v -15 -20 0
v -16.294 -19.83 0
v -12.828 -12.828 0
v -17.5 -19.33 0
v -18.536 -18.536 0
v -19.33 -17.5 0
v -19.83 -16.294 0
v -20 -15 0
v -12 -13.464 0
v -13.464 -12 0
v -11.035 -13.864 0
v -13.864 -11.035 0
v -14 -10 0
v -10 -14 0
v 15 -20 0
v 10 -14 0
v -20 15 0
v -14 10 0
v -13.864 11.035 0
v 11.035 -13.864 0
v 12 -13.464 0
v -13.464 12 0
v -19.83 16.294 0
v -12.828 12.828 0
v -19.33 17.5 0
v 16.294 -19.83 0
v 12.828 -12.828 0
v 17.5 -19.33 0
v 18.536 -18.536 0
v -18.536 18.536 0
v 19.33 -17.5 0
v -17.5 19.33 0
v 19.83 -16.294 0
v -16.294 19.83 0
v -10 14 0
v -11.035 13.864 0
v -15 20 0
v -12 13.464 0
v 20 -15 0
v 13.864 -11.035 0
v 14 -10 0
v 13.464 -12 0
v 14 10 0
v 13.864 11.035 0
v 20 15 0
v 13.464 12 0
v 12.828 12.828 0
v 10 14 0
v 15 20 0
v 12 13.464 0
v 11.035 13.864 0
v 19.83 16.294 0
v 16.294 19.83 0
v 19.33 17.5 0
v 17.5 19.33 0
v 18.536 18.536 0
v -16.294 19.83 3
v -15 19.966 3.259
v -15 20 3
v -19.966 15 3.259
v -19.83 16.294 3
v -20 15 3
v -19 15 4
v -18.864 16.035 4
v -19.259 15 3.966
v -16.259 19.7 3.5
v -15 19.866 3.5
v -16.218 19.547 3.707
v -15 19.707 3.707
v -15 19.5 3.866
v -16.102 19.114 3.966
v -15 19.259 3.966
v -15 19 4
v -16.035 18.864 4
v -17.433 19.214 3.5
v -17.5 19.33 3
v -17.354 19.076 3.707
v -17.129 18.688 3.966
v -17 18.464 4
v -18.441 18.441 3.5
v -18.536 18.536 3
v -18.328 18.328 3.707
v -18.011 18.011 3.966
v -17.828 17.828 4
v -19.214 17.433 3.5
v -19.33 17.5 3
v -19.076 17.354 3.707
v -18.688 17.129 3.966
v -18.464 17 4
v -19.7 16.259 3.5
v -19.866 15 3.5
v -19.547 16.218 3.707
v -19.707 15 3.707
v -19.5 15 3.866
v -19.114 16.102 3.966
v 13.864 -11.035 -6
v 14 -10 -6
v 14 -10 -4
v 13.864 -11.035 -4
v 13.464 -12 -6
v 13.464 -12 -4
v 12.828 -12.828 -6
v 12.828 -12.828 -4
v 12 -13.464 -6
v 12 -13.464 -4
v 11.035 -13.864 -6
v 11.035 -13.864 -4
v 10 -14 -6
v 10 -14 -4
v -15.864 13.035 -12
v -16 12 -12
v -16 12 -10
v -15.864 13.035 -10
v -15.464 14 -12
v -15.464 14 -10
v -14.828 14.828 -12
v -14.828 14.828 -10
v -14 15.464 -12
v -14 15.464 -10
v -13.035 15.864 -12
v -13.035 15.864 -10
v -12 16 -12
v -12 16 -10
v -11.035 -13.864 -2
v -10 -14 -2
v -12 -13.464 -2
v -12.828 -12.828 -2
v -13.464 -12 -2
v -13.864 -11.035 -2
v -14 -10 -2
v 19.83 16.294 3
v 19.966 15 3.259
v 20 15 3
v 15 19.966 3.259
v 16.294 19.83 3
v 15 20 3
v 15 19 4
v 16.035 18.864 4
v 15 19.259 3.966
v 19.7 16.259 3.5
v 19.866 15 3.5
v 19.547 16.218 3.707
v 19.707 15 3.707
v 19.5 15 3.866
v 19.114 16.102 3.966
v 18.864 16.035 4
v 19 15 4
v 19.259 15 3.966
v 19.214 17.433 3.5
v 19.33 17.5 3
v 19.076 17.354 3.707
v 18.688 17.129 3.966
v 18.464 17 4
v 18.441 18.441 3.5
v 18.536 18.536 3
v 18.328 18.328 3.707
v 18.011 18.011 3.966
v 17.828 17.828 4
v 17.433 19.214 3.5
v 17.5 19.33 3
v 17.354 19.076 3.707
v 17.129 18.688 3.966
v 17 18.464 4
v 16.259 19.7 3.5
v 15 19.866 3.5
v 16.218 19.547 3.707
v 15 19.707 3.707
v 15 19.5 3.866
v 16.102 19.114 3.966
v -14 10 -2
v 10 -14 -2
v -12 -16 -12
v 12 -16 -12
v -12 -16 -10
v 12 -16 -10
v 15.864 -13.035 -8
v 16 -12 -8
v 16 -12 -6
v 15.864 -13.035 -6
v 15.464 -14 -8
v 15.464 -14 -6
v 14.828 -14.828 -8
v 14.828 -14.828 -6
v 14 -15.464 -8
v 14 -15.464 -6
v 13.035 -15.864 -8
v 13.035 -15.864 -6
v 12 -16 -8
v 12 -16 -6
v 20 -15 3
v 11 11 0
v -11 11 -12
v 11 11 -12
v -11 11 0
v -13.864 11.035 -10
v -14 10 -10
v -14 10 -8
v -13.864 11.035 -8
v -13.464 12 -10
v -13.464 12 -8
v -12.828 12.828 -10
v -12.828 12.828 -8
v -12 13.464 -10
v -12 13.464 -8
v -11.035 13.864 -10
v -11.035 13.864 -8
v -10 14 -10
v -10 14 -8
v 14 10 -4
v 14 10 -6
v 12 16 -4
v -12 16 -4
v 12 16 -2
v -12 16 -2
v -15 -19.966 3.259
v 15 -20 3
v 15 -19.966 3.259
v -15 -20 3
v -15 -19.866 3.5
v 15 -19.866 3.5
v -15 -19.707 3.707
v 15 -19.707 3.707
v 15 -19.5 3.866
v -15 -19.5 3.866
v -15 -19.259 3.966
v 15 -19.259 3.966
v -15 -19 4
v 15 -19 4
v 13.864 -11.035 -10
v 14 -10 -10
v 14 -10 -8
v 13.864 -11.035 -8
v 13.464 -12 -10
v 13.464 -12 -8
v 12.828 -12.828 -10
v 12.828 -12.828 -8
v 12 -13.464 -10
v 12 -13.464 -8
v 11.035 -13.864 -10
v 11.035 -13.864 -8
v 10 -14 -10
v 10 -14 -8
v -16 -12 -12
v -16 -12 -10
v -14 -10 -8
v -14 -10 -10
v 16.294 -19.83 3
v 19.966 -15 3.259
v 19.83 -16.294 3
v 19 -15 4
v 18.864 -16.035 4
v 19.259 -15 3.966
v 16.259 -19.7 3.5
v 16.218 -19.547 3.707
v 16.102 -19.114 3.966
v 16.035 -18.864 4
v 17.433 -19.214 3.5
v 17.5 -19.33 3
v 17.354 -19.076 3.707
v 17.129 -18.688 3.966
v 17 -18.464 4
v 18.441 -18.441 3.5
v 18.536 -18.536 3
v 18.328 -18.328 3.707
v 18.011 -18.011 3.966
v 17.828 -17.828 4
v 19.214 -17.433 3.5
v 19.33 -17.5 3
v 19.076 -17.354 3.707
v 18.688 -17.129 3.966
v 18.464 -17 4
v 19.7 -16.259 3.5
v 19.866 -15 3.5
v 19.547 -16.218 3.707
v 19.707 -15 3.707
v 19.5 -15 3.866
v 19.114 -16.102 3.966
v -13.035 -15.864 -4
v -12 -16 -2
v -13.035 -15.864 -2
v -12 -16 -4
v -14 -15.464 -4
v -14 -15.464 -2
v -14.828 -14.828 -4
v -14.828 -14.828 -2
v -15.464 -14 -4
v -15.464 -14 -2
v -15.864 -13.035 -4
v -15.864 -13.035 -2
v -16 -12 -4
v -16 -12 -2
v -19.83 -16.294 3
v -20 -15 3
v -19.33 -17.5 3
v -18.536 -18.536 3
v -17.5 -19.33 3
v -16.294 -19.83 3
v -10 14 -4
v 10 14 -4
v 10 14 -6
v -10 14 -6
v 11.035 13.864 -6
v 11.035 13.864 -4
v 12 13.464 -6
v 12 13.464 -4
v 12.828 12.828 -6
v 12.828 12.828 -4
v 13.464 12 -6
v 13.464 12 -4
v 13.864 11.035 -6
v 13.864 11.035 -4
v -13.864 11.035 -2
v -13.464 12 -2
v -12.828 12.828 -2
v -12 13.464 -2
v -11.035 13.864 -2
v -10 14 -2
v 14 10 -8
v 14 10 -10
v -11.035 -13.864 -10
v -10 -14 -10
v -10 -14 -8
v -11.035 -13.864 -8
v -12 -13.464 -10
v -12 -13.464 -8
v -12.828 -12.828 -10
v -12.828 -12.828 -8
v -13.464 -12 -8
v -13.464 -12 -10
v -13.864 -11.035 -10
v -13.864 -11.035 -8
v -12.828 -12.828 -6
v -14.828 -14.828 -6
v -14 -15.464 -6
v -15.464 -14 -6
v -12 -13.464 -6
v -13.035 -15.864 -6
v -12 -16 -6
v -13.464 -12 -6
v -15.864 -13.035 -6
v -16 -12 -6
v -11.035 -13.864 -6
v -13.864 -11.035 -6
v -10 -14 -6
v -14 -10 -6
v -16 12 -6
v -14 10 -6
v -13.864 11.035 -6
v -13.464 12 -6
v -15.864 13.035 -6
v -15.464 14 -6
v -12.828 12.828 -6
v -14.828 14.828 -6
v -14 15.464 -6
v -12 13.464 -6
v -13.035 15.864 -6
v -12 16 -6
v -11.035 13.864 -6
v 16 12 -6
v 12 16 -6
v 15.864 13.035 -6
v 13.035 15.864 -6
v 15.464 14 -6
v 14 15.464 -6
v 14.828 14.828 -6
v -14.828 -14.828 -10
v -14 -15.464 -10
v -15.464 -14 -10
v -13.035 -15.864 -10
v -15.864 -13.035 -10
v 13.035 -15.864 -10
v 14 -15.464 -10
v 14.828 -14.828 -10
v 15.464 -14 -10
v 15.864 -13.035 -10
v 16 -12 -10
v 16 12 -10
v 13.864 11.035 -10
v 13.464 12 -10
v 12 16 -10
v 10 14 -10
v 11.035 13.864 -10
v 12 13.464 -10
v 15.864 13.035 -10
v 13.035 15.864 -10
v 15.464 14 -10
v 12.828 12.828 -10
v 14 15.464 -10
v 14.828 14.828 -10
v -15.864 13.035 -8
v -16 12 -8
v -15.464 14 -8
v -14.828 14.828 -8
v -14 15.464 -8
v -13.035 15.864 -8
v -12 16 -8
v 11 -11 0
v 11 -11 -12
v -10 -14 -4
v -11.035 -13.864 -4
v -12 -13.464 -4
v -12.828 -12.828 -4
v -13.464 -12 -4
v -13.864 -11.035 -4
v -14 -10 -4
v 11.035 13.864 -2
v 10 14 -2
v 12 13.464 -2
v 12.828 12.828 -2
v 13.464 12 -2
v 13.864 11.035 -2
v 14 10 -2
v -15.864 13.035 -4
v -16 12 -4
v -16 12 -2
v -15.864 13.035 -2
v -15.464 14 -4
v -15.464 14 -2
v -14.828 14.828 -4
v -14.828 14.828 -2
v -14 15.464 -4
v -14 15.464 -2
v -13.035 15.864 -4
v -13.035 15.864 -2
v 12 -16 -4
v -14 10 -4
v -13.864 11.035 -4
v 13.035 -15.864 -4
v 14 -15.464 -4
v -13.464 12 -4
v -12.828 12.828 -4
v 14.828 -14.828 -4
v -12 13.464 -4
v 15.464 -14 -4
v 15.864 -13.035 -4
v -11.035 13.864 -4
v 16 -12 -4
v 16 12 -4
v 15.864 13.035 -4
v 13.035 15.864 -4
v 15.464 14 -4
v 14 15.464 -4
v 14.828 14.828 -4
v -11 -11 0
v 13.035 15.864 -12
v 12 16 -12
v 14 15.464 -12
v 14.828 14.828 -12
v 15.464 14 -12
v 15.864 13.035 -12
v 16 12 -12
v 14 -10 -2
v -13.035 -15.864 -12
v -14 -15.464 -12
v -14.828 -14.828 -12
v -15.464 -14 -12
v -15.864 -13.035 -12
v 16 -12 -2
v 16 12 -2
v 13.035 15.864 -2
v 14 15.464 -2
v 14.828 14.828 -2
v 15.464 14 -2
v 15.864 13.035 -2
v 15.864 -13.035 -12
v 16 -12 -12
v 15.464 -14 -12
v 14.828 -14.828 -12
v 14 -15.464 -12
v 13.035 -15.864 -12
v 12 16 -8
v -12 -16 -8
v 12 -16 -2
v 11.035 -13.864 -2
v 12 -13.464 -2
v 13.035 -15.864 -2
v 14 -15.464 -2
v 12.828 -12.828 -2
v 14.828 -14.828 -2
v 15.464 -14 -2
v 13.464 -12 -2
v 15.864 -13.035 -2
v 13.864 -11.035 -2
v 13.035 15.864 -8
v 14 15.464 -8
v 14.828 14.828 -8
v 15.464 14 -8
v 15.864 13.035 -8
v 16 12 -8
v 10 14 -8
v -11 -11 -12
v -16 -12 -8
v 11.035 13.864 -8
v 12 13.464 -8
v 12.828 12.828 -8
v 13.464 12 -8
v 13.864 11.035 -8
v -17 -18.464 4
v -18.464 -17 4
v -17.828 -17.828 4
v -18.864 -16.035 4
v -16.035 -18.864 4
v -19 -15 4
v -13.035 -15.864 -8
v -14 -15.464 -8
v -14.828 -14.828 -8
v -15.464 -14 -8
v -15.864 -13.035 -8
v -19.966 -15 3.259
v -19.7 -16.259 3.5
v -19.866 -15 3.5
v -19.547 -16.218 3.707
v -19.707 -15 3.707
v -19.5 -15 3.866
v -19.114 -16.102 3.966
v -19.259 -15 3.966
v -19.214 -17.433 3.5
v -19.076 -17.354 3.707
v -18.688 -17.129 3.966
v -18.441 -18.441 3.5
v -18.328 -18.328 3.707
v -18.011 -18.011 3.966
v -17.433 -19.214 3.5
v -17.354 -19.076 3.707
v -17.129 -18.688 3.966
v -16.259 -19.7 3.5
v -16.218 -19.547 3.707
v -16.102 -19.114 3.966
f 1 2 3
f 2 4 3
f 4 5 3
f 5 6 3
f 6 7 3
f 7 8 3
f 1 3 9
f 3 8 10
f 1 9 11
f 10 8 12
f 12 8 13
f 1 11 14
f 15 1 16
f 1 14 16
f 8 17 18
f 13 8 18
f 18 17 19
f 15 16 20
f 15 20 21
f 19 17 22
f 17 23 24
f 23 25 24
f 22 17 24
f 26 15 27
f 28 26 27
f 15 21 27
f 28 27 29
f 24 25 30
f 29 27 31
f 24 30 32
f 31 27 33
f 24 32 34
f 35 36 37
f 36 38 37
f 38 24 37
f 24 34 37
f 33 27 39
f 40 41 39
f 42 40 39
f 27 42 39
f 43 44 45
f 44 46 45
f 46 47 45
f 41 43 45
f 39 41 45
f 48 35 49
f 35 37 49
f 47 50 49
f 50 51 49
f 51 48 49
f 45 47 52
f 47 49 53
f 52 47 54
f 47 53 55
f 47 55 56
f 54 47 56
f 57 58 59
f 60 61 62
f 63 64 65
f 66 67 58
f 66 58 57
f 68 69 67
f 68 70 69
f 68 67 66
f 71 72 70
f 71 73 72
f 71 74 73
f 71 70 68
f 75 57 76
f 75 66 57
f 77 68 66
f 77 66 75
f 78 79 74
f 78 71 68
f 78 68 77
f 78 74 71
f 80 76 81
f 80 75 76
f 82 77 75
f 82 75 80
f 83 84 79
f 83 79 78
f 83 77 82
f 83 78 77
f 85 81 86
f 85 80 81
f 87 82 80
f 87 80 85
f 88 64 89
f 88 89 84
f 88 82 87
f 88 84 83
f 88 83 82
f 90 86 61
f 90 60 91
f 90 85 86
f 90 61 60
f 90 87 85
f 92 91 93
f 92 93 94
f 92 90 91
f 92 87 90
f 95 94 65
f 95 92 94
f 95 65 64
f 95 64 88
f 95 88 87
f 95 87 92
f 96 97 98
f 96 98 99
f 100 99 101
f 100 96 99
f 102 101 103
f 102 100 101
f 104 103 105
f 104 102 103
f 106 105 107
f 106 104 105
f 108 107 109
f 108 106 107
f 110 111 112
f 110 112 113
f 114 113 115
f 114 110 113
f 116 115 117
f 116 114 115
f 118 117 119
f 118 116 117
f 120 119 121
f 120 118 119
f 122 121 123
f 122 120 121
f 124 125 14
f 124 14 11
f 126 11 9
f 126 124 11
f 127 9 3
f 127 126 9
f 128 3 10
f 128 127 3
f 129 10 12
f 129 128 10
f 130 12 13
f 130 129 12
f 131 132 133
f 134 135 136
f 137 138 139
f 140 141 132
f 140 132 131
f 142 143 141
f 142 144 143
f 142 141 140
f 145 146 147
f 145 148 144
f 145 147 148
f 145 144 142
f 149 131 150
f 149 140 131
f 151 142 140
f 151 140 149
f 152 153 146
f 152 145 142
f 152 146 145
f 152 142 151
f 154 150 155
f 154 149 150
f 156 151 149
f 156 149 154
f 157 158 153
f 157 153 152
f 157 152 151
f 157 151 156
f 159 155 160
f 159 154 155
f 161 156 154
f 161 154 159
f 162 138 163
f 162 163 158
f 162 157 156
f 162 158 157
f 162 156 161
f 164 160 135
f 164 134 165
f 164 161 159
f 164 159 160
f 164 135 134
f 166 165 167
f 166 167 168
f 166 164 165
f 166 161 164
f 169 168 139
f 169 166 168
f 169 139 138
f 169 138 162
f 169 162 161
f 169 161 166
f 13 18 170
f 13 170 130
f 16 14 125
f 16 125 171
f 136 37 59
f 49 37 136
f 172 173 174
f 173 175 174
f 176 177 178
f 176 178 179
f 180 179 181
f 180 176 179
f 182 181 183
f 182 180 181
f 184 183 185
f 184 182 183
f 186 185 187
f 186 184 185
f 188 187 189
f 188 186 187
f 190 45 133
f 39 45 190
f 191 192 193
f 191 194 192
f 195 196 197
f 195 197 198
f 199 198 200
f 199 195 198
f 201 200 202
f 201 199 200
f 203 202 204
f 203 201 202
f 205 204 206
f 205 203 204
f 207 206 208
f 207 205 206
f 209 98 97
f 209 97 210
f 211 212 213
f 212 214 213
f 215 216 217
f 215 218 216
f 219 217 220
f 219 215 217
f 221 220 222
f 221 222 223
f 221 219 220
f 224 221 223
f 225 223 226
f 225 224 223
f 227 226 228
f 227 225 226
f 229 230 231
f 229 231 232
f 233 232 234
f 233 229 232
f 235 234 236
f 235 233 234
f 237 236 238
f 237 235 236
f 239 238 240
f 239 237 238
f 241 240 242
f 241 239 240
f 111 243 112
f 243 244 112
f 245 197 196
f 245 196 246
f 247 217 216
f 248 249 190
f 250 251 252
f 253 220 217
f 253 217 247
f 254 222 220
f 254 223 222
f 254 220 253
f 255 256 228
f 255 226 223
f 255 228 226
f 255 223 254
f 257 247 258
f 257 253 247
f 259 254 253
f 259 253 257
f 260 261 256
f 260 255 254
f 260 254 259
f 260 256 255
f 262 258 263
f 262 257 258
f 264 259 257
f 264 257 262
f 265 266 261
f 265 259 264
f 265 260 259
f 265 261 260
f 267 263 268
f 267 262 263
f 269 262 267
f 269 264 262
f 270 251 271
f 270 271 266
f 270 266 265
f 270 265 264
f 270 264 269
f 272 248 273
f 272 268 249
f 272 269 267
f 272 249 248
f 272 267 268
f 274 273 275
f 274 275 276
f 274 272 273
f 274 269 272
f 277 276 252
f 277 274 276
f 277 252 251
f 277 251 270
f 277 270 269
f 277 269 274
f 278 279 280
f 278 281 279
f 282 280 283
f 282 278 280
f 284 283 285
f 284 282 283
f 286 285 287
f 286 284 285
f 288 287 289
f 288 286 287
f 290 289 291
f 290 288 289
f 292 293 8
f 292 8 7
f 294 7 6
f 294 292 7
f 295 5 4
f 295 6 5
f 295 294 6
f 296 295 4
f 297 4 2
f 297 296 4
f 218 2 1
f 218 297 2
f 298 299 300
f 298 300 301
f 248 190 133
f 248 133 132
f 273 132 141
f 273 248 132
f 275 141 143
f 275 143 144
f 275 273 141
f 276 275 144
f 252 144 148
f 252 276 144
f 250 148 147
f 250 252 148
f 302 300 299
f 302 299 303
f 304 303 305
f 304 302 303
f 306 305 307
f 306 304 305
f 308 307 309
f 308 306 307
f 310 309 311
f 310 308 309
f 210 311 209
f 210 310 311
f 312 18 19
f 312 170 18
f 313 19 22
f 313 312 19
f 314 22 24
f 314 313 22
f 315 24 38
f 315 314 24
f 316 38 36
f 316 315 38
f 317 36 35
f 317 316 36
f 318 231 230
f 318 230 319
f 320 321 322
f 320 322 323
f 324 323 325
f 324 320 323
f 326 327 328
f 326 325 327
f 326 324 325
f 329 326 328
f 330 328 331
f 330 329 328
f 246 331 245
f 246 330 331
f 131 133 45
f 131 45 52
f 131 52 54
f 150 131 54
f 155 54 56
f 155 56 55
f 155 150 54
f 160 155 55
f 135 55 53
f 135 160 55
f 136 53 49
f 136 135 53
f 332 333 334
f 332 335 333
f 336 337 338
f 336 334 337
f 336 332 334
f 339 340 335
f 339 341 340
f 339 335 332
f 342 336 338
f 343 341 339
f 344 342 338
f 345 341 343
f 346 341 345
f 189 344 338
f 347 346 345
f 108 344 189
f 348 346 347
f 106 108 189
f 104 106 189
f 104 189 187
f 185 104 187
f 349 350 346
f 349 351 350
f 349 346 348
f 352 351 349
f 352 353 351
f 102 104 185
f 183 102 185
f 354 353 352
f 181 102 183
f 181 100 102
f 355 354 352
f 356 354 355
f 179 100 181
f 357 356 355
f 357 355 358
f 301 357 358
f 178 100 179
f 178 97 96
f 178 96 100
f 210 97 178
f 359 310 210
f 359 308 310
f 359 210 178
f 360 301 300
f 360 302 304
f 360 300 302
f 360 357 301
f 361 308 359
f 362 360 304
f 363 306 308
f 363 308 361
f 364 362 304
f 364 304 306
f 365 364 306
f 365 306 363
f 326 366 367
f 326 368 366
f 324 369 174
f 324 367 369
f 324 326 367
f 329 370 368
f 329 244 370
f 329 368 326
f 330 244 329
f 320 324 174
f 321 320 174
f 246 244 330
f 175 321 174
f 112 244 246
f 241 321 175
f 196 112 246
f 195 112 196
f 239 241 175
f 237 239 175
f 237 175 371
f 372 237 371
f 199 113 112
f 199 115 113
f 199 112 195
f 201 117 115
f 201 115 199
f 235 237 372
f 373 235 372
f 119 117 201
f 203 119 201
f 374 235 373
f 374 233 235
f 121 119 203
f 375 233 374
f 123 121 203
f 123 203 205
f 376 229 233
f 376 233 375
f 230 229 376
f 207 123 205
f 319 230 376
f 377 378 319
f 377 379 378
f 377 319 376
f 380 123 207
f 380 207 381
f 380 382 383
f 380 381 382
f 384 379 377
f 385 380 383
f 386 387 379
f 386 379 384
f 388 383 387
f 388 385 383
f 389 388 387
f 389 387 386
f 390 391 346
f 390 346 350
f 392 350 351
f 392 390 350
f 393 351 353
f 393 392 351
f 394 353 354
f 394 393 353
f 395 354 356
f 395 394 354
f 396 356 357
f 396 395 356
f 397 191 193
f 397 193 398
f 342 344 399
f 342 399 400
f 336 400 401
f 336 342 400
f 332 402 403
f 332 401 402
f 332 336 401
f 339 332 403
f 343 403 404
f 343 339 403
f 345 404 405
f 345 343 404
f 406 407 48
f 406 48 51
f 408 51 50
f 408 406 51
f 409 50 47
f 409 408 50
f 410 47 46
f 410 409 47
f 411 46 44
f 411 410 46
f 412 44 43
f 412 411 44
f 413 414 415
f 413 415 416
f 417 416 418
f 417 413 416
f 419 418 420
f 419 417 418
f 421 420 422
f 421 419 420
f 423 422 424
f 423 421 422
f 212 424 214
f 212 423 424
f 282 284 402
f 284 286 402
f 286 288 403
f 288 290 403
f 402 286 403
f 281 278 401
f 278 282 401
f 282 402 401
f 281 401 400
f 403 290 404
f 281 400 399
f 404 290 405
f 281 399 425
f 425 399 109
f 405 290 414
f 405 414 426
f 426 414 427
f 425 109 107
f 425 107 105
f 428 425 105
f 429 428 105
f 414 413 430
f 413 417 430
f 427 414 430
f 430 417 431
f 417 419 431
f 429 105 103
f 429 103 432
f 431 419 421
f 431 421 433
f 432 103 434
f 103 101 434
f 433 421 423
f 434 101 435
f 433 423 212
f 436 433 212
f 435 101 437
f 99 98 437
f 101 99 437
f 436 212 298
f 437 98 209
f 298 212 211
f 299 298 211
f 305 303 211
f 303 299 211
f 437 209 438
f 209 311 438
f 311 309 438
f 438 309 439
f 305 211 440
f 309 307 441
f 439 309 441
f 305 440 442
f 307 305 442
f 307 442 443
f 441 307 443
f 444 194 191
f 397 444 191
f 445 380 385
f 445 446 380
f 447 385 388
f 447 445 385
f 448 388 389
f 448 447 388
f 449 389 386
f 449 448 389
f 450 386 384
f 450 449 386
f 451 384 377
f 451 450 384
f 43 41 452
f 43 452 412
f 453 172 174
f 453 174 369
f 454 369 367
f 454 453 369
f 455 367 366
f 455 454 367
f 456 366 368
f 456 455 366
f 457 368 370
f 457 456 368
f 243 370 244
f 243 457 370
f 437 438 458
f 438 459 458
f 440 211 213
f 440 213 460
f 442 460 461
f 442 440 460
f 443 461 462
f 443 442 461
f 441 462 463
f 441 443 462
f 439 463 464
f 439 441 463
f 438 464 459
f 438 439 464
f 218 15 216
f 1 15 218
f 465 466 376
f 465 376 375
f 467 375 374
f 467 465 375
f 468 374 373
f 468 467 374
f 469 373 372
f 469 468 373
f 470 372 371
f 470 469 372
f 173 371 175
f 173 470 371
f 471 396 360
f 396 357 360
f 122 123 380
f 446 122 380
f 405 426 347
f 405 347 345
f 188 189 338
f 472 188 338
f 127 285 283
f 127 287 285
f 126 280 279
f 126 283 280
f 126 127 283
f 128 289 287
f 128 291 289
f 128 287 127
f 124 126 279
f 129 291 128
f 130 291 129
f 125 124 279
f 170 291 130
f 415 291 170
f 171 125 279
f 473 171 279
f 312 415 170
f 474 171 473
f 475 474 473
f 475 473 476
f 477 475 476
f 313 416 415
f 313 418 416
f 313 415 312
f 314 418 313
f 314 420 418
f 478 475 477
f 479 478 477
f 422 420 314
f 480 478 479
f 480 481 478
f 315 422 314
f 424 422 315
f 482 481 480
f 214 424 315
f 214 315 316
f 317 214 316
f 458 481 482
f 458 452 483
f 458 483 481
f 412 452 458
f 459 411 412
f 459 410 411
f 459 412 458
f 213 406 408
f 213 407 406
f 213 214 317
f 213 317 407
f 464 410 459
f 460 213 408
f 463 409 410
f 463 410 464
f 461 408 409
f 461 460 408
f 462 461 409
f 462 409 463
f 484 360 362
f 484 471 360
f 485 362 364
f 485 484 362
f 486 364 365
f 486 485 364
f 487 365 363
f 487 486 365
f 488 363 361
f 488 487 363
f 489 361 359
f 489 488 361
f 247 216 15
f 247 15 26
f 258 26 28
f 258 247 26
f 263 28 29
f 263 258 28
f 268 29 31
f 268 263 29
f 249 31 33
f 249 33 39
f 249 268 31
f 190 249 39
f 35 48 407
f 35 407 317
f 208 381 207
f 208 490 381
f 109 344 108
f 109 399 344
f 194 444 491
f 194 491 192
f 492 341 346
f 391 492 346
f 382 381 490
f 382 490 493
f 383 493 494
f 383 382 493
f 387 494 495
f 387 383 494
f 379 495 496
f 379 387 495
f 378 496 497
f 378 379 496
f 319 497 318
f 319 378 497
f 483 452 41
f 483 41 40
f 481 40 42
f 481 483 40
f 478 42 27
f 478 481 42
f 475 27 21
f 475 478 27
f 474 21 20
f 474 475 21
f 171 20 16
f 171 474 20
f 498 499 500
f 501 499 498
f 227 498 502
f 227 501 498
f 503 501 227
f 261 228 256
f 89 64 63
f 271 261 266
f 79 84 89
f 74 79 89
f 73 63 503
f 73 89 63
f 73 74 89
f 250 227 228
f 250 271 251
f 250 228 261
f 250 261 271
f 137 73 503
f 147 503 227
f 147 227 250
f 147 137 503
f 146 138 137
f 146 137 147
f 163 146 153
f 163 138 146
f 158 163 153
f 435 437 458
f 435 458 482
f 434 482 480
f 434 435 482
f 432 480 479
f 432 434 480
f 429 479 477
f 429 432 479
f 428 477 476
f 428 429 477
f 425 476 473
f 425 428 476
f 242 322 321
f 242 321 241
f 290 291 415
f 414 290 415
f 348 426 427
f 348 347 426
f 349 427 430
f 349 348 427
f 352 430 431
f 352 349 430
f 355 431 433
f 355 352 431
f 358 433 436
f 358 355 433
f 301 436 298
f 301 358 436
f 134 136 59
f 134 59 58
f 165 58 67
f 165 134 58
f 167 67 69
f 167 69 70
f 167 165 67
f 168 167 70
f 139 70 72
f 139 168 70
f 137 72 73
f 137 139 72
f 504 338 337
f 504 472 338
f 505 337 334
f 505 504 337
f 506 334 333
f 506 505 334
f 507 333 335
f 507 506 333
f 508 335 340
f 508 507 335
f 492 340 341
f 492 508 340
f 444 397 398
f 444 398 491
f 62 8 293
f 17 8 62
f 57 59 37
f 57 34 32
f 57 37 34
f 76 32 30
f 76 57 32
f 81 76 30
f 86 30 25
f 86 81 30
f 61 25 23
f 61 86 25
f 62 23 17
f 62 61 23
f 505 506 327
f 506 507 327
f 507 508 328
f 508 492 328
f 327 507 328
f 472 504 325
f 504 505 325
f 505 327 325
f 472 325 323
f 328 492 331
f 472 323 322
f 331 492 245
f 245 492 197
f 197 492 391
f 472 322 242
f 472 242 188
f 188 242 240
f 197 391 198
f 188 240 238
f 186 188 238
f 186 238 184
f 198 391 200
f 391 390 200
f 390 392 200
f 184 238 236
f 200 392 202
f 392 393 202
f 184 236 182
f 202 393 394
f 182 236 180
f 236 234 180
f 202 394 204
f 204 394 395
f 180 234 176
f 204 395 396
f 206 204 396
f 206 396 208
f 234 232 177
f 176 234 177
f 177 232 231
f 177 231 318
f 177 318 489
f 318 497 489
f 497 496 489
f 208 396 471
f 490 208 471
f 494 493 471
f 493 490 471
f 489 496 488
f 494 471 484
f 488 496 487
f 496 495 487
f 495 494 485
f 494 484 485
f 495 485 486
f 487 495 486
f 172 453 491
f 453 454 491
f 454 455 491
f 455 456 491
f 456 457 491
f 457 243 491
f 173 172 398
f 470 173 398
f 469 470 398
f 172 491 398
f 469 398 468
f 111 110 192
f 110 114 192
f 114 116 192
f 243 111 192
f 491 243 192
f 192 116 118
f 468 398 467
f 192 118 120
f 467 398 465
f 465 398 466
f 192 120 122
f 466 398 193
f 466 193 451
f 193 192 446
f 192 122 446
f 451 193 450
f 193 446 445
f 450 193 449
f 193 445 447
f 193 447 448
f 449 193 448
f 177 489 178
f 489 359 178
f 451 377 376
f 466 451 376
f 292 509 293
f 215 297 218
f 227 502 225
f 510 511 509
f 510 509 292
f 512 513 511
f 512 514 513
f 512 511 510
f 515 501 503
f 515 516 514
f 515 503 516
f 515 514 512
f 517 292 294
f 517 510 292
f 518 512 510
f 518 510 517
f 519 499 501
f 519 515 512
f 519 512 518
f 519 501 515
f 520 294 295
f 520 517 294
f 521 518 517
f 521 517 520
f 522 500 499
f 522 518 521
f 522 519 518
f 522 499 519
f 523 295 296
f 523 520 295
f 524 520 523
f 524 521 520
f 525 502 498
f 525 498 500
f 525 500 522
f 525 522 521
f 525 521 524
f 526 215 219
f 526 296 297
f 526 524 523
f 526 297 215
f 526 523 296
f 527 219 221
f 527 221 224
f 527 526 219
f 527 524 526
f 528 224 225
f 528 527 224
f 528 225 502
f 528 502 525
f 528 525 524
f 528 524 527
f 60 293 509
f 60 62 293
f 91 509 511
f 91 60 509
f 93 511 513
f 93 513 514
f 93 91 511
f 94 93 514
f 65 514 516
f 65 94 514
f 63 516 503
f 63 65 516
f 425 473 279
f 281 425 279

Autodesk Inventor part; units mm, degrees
ref_plane "YZ Plane" through (0, 0, 0) normal (1, 0, 0) x (0, 1, 0)
ref_plane "XZ Plane" through (0, 0, 0) normal (0, 1, 0) x (-1, 0, 0)
ref_plane "XY Plane" through (0, 0, 0) normal (0, 0, 1) x (1, 0, 0)
sketch "Sketch1" plane through (0, 0, 0) normal (0, 0, 1) x (1, 0, 0)
  line L0 (16, -16) -> (-16, -16)
  line L1 (-16, -16) -> (-16, 16)
  line L2 (-16, 16) -> (16, 16)
  line L3 (16, 16) -> (16, -16)
  line L4 (16, -16) -> (-16, 16) construction
  line L5 (-16, -16) -> (16, 16) construction
  line L6 (14, 14) -> (-14, 14)
  line L7 (-14, 14) -> (-14, -14)
  line L8 (-14, -14) -> (14, -14)
  line L9 (14, -14) -> (14, 14)
  line L10 (20, -20) -> (-20, -20)
  line L11 (-20, -20) -> (-20, 20)
  line L12 (-20, 20) -> (20, 20)
  line L13 (20, 20) -> (20, -20)
  line L14 (-11, 11) -> (11, 11)
  line L15 (11, 11) -> (11, -11)
  line L16 (11, -11) -> (-11, -11)
  line L17 (-11, -11) -> (-11, 11)
  point P0 (0, 0)
  dimension "d0" = 32
  dimension "d1" = 32
  dimension "d2" = 2
  dimension "d10" = 4
  dimension "d12" = 3
extrude "Extrusion1" add sketch "Sketch1" against normal blind 2 contours L9 L8 L7 L6 | L14 L15 L16 L17
extrude "Extrusion2" add sketch "Sketch1" against normal blind 2 from surface at -2 contours L0 L1 L2 L3 | L9 L8 L7 L6 | L14 L15 L16 L17
fillet "Fillet1" radius 4 8 edges at (-16, 16, -3) (16, 16, -3) (-16, -16, -3) (14, -14, -1) (-14, -14, -1) (-14, 14, -1) (14, 14, -1) (16, -16, -3)
pattern_linear "Rectangular Pattern1" count 3 spacing 4 along (0, 0, -1)
extrude "Extrusion3" add sketch "Sketch1" along normal blind 4 contours L0 L1 L2 L3 | L9 L8 L7 L6 | L10 L11 L12 L13 | L14 L15 L16 L17
fillet "Fillet2" radius 5 4 edges at (-20, 20, 2) (20, 20, 2) (-20, -20, 2) (20, -20, 2)
extrude "Extrusion4" cut sketch "Sketch1" against normal through all contours L14 L15 L16 L17
fillet "Fillet3" radius 1 8 edges at (0, 20, 4) (-18.5355, 18.5355, 4) (-20, 0, 4) (-18.5355, -18.5355, 4) (0, -20, 4) (18.5355, -18.5355, 4) (20, 0, 4) (18.5355, 18.5355, 4)
properties part number "PWTR-0123" material "Rubber"
